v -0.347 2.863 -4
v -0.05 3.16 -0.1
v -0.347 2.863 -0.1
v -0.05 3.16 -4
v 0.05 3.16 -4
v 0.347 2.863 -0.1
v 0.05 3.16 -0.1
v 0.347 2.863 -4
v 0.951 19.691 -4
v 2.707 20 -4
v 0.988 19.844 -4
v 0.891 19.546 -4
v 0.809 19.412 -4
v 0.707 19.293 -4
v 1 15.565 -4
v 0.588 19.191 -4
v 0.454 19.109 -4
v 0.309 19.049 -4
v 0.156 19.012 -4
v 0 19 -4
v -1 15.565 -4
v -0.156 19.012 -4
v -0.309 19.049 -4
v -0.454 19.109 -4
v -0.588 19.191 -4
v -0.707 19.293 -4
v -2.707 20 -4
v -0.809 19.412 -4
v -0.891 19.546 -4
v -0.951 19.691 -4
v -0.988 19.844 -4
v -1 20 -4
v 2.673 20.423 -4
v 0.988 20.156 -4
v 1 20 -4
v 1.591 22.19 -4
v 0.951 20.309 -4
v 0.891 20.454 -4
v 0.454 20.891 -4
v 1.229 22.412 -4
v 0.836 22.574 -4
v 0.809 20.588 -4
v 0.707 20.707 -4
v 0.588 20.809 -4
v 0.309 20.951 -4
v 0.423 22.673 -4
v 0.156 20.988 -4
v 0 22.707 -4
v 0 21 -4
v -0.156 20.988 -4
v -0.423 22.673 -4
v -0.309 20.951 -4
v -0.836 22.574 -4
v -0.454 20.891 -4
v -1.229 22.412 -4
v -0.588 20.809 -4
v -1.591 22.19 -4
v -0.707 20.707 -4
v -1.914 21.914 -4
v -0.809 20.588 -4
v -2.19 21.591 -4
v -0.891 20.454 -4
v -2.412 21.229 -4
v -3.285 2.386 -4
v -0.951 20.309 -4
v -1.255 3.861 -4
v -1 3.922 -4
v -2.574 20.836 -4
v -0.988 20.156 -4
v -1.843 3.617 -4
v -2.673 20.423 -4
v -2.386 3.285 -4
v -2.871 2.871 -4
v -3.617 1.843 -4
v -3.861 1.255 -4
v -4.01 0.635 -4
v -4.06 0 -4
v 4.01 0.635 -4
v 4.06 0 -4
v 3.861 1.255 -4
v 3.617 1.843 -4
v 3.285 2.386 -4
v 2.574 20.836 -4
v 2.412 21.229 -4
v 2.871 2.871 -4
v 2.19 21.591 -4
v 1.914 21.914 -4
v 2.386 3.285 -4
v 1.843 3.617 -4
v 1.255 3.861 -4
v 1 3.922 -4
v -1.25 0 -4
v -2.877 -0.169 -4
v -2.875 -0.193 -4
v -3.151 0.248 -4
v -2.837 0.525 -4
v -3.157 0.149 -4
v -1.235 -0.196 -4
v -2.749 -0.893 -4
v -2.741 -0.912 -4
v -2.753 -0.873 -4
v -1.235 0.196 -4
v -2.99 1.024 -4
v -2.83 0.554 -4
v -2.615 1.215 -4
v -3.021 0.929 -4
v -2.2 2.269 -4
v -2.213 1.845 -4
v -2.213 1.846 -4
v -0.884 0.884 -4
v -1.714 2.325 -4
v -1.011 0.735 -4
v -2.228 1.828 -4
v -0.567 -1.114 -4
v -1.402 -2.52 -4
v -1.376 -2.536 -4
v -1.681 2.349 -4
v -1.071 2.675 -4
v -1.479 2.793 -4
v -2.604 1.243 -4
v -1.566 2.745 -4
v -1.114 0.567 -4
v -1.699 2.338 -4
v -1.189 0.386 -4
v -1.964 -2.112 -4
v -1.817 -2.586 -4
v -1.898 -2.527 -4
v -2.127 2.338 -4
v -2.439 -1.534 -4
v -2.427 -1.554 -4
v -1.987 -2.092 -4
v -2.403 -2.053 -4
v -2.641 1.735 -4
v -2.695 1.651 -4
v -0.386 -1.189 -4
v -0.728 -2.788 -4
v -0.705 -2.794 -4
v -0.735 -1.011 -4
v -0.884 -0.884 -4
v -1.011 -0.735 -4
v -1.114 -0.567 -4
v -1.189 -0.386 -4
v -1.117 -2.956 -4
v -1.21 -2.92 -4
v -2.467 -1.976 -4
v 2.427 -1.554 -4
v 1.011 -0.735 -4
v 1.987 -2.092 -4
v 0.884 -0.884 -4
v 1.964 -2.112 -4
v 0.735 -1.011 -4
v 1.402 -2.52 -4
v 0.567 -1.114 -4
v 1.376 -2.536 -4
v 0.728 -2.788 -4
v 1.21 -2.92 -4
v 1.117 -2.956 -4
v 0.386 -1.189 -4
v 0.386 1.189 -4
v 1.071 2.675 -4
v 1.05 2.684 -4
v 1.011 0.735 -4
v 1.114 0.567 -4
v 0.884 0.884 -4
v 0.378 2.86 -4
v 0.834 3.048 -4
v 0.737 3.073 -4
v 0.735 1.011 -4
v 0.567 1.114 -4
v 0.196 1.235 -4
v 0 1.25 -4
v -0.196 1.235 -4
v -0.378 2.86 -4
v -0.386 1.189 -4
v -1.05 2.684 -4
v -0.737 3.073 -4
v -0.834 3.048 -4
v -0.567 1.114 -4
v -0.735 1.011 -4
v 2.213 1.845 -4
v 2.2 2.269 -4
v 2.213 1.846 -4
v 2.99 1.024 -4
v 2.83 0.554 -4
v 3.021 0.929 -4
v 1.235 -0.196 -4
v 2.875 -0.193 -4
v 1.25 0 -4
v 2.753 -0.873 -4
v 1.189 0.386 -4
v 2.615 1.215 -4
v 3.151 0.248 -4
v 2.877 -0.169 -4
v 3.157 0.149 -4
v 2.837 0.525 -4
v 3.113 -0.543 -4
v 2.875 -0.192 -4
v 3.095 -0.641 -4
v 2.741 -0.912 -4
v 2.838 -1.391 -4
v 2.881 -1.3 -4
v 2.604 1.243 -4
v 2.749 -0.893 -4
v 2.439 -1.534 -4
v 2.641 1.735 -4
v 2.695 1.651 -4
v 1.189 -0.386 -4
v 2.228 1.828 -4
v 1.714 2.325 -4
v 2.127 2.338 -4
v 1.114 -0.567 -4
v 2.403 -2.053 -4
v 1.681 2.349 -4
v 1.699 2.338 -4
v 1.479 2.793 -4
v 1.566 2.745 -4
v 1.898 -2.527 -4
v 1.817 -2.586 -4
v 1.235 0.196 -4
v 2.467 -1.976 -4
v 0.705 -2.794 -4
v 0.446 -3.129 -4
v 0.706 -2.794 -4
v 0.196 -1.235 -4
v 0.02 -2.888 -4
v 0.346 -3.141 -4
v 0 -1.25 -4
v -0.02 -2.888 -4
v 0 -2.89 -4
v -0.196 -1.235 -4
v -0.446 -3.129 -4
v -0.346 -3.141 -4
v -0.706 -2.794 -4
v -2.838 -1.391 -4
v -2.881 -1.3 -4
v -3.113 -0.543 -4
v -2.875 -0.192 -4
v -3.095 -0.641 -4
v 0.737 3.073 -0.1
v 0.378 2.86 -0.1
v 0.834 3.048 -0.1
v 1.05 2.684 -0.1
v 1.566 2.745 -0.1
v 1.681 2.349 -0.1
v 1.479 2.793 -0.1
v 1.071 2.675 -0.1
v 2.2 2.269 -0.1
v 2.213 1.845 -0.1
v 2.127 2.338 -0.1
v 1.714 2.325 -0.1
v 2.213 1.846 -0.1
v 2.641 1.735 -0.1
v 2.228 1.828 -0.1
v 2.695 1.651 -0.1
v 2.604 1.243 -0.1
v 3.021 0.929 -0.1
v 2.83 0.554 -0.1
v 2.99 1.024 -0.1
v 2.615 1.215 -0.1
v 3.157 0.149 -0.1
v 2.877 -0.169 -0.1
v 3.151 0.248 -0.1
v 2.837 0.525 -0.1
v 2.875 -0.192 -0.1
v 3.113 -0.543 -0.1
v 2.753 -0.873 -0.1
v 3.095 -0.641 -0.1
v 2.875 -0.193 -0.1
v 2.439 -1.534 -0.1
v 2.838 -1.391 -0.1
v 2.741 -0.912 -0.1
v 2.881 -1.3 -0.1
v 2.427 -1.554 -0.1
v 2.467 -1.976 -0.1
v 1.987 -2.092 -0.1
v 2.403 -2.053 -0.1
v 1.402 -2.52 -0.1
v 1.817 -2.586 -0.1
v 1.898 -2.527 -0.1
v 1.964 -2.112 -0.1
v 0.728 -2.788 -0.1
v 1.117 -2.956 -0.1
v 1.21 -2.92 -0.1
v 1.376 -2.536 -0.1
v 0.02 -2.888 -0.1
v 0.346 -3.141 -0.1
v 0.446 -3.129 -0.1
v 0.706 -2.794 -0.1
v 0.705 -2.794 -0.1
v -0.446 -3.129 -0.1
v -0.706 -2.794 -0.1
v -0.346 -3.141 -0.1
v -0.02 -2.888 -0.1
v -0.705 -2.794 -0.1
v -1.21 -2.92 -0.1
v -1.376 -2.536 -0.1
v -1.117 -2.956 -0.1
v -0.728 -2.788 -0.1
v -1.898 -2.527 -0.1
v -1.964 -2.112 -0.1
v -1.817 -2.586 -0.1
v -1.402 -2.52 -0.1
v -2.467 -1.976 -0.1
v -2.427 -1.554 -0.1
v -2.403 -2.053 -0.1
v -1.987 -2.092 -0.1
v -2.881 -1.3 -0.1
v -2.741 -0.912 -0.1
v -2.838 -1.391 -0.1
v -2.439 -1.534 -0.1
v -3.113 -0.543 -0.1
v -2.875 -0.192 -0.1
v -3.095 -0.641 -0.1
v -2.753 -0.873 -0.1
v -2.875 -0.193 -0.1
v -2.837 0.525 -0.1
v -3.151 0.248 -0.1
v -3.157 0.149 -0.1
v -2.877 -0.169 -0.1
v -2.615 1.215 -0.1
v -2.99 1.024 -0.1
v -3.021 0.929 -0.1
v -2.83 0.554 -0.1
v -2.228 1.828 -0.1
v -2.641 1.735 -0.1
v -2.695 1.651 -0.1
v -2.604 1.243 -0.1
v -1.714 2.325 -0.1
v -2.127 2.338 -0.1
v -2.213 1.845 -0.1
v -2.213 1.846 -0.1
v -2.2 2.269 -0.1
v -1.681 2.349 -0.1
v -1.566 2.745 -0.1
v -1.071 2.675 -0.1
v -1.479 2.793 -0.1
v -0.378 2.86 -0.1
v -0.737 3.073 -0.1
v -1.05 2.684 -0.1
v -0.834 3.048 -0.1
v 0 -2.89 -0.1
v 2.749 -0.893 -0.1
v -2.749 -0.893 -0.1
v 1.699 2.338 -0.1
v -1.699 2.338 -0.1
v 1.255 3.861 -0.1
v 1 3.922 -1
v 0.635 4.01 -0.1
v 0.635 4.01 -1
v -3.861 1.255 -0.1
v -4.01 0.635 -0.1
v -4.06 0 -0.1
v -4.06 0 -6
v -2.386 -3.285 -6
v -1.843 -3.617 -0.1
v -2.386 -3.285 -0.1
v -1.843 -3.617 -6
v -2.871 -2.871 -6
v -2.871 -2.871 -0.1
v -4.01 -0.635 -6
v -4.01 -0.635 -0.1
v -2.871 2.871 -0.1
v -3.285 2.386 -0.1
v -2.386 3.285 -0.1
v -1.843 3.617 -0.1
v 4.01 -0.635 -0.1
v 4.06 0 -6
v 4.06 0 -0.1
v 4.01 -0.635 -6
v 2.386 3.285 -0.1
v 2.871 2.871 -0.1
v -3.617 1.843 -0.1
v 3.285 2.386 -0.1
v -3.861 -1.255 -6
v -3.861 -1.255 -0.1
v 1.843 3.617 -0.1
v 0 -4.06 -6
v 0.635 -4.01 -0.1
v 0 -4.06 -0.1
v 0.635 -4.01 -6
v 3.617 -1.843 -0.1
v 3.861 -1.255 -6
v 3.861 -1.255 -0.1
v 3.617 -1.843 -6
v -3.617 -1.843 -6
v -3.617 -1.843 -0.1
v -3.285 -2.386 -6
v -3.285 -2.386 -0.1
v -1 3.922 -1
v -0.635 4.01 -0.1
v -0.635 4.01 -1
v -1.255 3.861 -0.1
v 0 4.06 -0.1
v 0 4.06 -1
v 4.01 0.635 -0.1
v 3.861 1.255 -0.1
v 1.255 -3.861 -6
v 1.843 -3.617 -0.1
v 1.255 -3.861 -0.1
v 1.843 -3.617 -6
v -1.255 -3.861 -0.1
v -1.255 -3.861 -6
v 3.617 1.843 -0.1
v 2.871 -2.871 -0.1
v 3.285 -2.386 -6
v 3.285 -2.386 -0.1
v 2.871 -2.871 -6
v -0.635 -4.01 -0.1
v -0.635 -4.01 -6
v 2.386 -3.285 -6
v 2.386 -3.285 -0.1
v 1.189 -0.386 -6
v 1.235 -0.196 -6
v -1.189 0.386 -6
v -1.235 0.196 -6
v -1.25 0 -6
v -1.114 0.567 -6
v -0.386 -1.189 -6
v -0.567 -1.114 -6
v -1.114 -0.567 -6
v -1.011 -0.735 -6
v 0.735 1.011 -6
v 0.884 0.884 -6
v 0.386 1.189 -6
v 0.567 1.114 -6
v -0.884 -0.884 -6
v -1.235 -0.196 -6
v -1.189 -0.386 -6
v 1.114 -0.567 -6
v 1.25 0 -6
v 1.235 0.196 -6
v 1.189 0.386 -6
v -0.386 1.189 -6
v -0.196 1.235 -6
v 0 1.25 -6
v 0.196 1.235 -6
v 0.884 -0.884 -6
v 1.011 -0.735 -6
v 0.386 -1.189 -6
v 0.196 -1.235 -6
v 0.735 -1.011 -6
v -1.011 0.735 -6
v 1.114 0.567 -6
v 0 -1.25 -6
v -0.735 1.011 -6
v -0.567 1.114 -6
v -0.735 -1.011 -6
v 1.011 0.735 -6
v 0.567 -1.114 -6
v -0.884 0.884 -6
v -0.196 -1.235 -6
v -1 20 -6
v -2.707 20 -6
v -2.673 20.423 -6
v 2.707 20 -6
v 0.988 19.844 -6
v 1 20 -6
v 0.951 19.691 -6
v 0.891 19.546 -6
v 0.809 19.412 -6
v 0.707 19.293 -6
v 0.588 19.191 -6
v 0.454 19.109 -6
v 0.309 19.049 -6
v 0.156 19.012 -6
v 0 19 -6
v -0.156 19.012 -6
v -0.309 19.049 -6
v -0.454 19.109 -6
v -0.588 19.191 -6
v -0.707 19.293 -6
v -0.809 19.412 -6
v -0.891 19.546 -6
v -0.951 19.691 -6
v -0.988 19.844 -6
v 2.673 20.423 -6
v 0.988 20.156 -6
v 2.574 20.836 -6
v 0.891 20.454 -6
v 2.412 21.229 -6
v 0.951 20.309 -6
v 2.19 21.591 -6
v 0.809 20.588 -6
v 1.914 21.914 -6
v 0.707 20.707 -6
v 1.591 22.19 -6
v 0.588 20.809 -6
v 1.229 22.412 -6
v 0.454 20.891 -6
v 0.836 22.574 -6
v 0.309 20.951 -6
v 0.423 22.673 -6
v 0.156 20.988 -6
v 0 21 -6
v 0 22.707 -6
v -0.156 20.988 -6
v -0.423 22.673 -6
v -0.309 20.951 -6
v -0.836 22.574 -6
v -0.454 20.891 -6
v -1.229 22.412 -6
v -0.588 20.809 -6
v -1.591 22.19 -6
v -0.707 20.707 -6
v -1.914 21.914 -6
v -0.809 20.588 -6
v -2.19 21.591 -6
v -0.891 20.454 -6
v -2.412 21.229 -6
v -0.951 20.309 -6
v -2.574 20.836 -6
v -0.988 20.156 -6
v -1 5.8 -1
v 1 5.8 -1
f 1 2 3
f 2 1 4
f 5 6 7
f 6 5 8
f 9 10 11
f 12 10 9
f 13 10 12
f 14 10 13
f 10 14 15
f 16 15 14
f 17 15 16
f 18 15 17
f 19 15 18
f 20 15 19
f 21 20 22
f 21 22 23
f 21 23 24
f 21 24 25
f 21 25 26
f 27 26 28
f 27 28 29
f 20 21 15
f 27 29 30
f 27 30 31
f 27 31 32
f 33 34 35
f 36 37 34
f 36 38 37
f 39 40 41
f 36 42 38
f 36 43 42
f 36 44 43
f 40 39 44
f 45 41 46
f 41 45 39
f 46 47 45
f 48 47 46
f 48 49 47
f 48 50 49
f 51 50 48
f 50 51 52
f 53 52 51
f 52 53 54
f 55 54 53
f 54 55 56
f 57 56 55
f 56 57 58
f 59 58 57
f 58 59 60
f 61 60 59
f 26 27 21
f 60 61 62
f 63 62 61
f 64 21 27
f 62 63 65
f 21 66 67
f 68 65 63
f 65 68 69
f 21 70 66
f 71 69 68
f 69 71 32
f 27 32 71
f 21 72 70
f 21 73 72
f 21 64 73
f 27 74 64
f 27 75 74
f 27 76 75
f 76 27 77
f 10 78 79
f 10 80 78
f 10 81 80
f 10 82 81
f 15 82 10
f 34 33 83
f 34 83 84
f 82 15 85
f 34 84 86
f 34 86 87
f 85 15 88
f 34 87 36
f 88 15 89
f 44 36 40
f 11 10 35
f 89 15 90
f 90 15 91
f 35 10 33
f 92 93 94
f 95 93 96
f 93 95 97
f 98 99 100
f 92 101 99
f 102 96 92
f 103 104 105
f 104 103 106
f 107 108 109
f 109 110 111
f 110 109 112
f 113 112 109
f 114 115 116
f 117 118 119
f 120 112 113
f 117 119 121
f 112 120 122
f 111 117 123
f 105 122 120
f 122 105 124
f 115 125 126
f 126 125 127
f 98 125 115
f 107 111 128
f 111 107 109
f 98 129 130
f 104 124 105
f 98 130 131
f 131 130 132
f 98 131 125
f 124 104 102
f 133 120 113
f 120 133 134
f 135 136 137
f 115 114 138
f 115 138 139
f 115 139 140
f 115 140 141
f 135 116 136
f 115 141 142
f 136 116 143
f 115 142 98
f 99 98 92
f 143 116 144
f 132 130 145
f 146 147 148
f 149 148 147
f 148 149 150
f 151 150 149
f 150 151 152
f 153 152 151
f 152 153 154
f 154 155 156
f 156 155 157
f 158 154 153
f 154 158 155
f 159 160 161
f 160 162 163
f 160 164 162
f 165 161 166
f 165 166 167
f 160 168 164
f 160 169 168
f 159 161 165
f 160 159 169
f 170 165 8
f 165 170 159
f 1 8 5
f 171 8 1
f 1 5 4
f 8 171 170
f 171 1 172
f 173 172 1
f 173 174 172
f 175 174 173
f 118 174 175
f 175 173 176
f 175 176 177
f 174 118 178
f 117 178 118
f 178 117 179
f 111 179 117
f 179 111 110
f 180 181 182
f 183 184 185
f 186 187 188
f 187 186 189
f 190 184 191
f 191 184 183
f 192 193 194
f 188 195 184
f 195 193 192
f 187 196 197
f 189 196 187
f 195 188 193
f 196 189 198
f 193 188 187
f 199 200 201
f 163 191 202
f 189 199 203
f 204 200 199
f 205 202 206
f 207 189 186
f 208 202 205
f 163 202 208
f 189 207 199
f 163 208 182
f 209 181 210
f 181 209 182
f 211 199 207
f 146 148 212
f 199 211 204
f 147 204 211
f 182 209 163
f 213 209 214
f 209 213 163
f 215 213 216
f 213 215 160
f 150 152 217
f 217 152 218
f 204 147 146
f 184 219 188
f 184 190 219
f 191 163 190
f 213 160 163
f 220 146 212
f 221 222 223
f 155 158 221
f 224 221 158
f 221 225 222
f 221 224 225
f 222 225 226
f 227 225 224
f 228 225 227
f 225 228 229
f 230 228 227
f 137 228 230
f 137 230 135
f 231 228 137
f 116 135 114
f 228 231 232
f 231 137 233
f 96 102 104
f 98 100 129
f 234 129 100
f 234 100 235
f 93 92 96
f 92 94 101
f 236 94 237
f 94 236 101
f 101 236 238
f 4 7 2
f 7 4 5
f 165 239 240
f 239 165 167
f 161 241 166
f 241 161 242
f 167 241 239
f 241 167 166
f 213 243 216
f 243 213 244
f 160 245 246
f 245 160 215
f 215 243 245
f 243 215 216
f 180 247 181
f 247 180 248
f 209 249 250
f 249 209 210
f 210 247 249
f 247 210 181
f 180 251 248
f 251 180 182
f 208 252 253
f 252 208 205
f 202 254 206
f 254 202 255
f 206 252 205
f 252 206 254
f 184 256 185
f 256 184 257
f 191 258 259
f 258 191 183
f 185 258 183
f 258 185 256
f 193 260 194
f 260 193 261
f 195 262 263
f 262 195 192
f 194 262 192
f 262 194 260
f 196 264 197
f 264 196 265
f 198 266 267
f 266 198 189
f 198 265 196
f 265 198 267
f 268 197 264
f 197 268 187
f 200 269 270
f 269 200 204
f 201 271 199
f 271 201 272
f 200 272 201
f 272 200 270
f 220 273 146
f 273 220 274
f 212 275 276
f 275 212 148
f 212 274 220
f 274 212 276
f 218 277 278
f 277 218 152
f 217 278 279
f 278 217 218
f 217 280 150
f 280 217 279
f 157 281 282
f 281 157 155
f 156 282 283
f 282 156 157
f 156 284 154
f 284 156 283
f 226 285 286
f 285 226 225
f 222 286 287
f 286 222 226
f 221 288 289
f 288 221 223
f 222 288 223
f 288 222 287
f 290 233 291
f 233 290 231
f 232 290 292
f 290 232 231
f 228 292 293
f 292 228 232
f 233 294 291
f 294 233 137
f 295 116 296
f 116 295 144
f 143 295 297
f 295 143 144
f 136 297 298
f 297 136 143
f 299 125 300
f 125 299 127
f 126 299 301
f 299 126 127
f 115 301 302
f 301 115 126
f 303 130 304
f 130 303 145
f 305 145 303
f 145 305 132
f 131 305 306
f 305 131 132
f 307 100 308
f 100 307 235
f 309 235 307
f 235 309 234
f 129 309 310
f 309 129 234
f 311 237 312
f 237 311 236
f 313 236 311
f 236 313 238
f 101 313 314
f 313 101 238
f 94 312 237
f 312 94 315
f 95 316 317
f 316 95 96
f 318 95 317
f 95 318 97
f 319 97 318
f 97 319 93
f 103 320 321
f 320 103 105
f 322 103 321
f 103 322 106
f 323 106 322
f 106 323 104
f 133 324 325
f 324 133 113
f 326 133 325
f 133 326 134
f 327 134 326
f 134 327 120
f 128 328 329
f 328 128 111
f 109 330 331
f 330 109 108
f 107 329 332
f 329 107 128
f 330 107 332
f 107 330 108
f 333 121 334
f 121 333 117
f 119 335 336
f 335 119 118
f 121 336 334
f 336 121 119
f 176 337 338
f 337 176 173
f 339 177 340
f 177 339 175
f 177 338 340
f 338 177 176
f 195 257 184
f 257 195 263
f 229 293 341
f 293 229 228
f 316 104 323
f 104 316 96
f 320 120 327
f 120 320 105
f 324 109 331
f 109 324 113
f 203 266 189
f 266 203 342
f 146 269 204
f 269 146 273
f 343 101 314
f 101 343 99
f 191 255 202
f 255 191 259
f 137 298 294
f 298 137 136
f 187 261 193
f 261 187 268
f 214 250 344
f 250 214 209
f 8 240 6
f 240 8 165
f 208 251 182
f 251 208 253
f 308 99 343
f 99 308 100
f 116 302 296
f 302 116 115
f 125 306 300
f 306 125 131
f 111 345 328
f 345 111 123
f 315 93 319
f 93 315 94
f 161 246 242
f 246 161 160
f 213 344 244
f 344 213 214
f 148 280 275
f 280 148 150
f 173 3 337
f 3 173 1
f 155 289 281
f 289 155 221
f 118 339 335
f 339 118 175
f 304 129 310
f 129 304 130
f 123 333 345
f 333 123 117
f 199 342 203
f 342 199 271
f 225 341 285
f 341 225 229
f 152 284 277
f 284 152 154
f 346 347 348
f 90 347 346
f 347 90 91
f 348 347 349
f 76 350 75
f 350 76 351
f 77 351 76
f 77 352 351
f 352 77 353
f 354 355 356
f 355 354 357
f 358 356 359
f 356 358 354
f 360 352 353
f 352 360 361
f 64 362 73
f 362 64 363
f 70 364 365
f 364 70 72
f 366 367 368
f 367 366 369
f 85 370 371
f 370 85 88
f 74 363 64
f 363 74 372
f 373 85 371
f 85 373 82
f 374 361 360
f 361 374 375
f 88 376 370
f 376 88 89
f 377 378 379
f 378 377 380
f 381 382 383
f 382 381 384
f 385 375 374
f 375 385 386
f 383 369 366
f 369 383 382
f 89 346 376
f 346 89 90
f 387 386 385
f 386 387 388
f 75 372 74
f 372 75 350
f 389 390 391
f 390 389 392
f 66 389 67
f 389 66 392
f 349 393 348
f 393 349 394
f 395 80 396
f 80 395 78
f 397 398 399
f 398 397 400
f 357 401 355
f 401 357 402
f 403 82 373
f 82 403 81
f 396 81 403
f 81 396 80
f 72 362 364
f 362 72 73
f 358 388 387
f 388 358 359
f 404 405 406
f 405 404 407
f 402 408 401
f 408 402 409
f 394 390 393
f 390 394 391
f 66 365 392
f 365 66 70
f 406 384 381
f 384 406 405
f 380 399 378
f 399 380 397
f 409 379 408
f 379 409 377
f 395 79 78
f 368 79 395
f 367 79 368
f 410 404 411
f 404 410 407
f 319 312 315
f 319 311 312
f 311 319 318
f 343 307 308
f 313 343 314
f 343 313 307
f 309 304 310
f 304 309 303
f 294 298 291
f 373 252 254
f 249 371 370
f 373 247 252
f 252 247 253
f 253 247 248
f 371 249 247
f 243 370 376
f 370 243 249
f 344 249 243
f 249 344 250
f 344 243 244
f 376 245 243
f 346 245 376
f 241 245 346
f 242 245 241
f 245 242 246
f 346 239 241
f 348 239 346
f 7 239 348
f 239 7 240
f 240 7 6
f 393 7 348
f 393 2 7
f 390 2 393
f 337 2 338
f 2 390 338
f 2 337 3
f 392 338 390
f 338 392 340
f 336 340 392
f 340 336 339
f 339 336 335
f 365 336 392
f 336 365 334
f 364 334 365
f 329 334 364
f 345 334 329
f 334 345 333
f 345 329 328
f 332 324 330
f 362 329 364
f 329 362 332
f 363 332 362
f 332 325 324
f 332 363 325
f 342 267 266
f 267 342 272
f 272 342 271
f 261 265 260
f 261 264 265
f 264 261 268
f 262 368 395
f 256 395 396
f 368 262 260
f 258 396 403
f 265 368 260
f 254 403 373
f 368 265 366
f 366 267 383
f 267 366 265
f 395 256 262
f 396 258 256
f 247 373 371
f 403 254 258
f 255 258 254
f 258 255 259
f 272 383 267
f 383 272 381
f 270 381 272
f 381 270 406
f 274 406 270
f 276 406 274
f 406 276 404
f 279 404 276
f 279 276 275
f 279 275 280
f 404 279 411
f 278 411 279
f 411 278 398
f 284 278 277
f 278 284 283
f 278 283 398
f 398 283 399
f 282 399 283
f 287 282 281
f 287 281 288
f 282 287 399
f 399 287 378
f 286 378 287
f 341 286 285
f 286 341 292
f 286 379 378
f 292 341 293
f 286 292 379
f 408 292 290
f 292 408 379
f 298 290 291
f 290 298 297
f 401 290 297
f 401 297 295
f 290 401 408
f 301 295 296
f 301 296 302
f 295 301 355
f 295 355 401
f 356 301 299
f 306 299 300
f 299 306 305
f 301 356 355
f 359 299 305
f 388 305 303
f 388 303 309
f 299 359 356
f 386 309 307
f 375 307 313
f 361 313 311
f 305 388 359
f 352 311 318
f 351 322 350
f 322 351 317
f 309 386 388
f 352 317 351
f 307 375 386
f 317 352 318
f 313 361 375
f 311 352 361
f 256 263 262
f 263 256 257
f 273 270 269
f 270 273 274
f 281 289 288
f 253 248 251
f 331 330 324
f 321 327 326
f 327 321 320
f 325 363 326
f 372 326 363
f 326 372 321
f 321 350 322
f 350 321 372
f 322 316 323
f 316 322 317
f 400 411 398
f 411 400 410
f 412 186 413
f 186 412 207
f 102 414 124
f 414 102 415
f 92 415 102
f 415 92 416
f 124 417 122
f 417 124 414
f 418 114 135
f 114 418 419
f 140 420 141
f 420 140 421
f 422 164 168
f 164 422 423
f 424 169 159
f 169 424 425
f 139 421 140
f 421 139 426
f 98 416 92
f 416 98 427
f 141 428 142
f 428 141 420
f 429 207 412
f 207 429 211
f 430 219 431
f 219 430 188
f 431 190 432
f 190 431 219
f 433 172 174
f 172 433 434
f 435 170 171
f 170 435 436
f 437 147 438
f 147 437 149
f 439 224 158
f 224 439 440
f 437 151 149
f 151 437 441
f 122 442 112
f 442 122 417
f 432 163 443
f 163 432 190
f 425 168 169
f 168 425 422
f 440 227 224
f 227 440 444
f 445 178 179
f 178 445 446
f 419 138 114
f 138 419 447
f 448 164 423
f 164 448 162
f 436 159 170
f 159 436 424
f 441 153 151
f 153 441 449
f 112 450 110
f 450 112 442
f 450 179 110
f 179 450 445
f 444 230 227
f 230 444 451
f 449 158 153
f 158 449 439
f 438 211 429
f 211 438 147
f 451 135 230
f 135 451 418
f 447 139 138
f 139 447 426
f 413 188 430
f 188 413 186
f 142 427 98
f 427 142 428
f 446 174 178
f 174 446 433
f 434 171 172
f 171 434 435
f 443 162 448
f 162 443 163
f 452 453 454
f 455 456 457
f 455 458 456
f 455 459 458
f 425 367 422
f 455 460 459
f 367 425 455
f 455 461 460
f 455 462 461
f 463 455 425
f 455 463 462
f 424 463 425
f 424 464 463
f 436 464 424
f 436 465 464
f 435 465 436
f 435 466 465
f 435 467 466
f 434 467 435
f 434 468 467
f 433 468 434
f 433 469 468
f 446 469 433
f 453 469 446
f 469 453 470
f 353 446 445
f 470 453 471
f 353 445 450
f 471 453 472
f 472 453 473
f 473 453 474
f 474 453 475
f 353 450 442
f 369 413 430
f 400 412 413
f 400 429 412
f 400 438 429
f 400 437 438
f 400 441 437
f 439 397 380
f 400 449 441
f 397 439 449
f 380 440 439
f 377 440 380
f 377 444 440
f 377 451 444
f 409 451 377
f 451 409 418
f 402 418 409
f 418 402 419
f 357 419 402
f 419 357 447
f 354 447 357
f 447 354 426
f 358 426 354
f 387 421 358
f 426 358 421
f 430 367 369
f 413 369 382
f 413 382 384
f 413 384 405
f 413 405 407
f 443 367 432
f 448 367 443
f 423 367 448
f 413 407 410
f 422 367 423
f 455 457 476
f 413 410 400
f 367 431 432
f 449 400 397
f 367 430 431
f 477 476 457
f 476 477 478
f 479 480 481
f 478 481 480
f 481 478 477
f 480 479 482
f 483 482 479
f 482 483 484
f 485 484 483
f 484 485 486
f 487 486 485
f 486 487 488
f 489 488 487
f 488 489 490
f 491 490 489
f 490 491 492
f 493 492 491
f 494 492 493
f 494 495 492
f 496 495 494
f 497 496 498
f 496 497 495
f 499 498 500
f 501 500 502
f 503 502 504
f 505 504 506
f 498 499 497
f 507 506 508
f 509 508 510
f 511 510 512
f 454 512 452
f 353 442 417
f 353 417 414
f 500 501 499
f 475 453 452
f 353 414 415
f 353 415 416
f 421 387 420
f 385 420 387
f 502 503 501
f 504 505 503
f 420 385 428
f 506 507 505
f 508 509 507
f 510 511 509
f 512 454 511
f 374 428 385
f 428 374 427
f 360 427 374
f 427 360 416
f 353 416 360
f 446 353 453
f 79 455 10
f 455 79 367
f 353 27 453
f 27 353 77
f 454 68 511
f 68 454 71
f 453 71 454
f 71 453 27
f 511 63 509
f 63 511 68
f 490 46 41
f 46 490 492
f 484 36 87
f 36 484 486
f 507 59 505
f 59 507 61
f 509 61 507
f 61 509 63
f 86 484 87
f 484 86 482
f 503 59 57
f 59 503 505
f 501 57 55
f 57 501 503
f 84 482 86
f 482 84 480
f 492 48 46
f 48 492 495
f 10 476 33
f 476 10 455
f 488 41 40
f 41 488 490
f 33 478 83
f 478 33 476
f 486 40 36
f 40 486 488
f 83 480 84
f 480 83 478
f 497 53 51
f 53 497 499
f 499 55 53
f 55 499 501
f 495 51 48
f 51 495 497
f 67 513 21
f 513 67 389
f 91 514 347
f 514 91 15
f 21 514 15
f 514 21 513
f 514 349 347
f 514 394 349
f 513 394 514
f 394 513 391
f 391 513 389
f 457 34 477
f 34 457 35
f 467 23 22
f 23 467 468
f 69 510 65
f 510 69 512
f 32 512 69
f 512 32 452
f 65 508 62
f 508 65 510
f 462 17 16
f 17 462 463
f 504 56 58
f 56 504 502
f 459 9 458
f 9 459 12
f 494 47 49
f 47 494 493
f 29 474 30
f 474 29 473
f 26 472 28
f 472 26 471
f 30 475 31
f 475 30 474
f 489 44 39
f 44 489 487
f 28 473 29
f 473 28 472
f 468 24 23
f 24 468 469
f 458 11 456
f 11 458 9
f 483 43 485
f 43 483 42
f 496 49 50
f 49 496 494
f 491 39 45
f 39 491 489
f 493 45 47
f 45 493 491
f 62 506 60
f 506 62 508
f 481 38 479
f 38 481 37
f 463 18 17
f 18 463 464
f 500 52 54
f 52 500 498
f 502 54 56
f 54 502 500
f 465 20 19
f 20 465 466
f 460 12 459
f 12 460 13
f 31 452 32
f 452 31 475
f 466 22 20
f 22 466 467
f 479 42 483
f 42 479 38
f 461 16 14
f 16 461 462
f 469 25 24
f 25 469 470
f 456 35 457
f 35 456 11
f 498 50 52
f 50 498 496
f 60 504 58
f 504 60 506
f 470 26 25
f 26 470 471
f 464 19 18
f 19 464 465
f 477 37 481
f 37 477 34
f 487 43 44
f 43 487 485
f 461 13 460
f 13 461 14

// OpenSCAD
/**
 *  Parametric servo arm generator for OpenScad
 *  Générateur de palonnier de servo pour OpenScad
 *
 *  Copyright (c) 2012 Charles Rincheval.  All rights reserved.
 *
 *  This library is free software; you can redistribute it and/or
 *  modify it under the terms of the GNU Lesser General Public
 *  License as published by the Free Software Foundation; either
 *  version 2.1 of the License, or (at your option) any later version.
 *
 *  This library is distributed in the hope that it will be useful,
 *  but WITHOUT ANY WARRANTY; without even the implied warranty of
 *  MERCHANTABILITY or FITNESS FOR A PARTICULAR PURPOSE.  See the GNU
 *  Lesser General Public License for more details.
 *
 *  You should have received a copy of the GNU Lesser General Public
 *  License along with this library; if not, write to the Free Software
 *  Foundation, Inc., 51 Franklin St, Fifth Floor, Boston, MA  02110-1301  USA
 *
 *  Last update :
 *  https://github.com/hugokernel/OpenSCAD_ServoArms
 *
 *  http://www.digitalspirit.org/
 */

arm_length = 20;

arm_count = 1; // [1,2,3,4,5,6,7,8]

//  Clear between arm head and servo head (PLA: 0.3, ABS 0.2)
SERVO_HEAD_CLEAR = 0.2; // [0.2,0.3,0.4,0.5]

$fn = 40 / 1;

/**
 *  Head / Tooth parameters
 *  Futaba 3F Standard Spline
 *  http://www.servocity.com/html/futaba_servo_splines.html
 *
 *  First array (head related) :
 *  0. Head external diameter
 *  1. Head heigth
 *  2. Head thickness
 *  3. Head screw diameter
 *
 *  Second array (tooth related) :
 *  0. Tooth count
 *  1. Tooth height
 *  2. Tooth length
 *  3. Tooth width
 */
FUTABA_3F_SPLINE = [
    [5.92, 4, 1.1, 2.5],
    [25, 0.3, 0.7, 0.1]
];

module servo_futaba_3f(length, count) {
    servo_arm(FUTABA_3F_SPLINE, [length, count]);
}

/**
 *  If you want to support a new servo, juste add a new spline definition array
 *  and a module named like servo_XXX_YYY where XXX is servo brand and YYY is the
 *  connection type (3f) or the servo type (s3003)
 */

module servo_standard(length, count) {
    servo_futaba_3f(length, count);
}

/**
 *  Tooth
 *
 *    |<-w->|
 *    |_____|___
 *    /     \  ^h
 *  _/       \_v
 *   |<--l-->|
 *
 *  - tooth length (l)
 *  - tooth width (w)
 *  - tooth height (h)
 *  - height
 *
 */
module servo_head_tooth(length, width, height, head_height) {
    linear_extrude(height = head_height) {
        polygon([[-length / 2, 0], [-width / 2, height], [width / 2, height], [length / 2,0]]);
    }
}

/**
 *  Servo head
 */
module servo_head(params, clear = SERVO_HEAD_CLEAR) {

    head = params[0];
    tooth = params[1];

    head_diameter = head[0];
    head_heigth = head[1];

    tooth_count = tooth[0];
    tooth_height = tooth[1];
    tooth_length = tooth[2];
    tooth_width = tooth[3];

    % cylinder(r = head_diameter / 2, h = head_heigth + 1);

    cylinder(r = head_diameter / 2 - tooth_height + 0.03 + clear, h = head_heigth);

    for (i = [0 : tooth_count]) {
        rotate([0, 0, i * (360 / tooth_count)]) {
            translate([0, head_diameter / 2 - tooth_height + clear, 0]) {
                servo_head_tooth(tooth_length, tooth_width, tooth_height, head_heigth);
            }
        }
    }
}

/**
 *  Servo hold
 *  - Head / Tooth parameters
 *  - Arms params (length and count)
 */
module servo_arm(params, arms) {

    head = params[0];
    tooth = params[1];

    head_diameter = head[0];
    head_heigth = head[1];
    head_thickness = head[2];
    head_screw_diameter = head[3];

    tooth_length = tooth[2];
    tooth_width = tooth[3];

    arm_length = arms[0];
    arm_count = arms[1];

    /**
     *  Servo arm
     *  - length is from center to last hole
     */
    module arm(tooth_length, tooth_width, head_height, head_heigth, hole_count = 1) {

        arm_screw_diameter = 2;

        difference() {
            union() {
                cylinder(r = tooth_width / 2, h = head_heigth);

                linear_extrude(height = head_heigth) {
                    polygon([
                        [-tooth_width / 2, 0], [-tooth_width / 3, tooth_length],
                        [tooth_width / 3, tooth_length], [tooth_width / 2, 0]
                    ]);
                }

                translate([0, tooth_length, 0]) {
                    cylinder(r = tooth_width / 3, h = head_heigth);
                }

                if (tooth_length >= 12) {
                    translate([-head_heigth / 2 + 2, 3.8, -4]) {
                        rotate([90, 0, 0]) {
                            rotate([0, -90, 0]) {
                                linear_extrude(height = head_heigth) {
                                    polygon([
                                        [-tooth_length / 1.7, 4], [0, 4], [0, - head_height + 5],
                                        [-2, - head_height + 5]
                                    ]);
                                }
                            }
                        }
                    }
                }
            }

            // Hole
            for (i = [0 : hole_count - 1]) {
                //translate([0, length - (length / hole_count * i), -1]) {
                translate([0, tooth_length - (4 * i), -1]) {
                    cylinder(r = arm_screw_diameter / 2, h = 10);
                }
            }

            cylinder(r = head_screw_diameter / 2, h = 10);
        }
    }

    difference() {
        translate([0, 0, 0.1]) {
            cylinder(r = head_diameter / 2 + head_thickness, h = head_heigth + 1);
        }

        cylinder(r = head_screw_diameter / 2, h = 10);

        servo_head(params);
    }

    arm_thickness = head_thickness;

    // Arm
    translate([0, 0, head_heigth]) {
        for (i = [0 : arm_count - 1]) {
            rotate([0, 0, i * (360 / arm_count)]) {
                arm(arm_length, head_diameter + arm_thickness * 2, head_heigth, 2);
            }
        }
    }
}

module demo() {
    rotate([0, 180, 0])
        servo_standard(arm_length, arm_count);
}

demo();
